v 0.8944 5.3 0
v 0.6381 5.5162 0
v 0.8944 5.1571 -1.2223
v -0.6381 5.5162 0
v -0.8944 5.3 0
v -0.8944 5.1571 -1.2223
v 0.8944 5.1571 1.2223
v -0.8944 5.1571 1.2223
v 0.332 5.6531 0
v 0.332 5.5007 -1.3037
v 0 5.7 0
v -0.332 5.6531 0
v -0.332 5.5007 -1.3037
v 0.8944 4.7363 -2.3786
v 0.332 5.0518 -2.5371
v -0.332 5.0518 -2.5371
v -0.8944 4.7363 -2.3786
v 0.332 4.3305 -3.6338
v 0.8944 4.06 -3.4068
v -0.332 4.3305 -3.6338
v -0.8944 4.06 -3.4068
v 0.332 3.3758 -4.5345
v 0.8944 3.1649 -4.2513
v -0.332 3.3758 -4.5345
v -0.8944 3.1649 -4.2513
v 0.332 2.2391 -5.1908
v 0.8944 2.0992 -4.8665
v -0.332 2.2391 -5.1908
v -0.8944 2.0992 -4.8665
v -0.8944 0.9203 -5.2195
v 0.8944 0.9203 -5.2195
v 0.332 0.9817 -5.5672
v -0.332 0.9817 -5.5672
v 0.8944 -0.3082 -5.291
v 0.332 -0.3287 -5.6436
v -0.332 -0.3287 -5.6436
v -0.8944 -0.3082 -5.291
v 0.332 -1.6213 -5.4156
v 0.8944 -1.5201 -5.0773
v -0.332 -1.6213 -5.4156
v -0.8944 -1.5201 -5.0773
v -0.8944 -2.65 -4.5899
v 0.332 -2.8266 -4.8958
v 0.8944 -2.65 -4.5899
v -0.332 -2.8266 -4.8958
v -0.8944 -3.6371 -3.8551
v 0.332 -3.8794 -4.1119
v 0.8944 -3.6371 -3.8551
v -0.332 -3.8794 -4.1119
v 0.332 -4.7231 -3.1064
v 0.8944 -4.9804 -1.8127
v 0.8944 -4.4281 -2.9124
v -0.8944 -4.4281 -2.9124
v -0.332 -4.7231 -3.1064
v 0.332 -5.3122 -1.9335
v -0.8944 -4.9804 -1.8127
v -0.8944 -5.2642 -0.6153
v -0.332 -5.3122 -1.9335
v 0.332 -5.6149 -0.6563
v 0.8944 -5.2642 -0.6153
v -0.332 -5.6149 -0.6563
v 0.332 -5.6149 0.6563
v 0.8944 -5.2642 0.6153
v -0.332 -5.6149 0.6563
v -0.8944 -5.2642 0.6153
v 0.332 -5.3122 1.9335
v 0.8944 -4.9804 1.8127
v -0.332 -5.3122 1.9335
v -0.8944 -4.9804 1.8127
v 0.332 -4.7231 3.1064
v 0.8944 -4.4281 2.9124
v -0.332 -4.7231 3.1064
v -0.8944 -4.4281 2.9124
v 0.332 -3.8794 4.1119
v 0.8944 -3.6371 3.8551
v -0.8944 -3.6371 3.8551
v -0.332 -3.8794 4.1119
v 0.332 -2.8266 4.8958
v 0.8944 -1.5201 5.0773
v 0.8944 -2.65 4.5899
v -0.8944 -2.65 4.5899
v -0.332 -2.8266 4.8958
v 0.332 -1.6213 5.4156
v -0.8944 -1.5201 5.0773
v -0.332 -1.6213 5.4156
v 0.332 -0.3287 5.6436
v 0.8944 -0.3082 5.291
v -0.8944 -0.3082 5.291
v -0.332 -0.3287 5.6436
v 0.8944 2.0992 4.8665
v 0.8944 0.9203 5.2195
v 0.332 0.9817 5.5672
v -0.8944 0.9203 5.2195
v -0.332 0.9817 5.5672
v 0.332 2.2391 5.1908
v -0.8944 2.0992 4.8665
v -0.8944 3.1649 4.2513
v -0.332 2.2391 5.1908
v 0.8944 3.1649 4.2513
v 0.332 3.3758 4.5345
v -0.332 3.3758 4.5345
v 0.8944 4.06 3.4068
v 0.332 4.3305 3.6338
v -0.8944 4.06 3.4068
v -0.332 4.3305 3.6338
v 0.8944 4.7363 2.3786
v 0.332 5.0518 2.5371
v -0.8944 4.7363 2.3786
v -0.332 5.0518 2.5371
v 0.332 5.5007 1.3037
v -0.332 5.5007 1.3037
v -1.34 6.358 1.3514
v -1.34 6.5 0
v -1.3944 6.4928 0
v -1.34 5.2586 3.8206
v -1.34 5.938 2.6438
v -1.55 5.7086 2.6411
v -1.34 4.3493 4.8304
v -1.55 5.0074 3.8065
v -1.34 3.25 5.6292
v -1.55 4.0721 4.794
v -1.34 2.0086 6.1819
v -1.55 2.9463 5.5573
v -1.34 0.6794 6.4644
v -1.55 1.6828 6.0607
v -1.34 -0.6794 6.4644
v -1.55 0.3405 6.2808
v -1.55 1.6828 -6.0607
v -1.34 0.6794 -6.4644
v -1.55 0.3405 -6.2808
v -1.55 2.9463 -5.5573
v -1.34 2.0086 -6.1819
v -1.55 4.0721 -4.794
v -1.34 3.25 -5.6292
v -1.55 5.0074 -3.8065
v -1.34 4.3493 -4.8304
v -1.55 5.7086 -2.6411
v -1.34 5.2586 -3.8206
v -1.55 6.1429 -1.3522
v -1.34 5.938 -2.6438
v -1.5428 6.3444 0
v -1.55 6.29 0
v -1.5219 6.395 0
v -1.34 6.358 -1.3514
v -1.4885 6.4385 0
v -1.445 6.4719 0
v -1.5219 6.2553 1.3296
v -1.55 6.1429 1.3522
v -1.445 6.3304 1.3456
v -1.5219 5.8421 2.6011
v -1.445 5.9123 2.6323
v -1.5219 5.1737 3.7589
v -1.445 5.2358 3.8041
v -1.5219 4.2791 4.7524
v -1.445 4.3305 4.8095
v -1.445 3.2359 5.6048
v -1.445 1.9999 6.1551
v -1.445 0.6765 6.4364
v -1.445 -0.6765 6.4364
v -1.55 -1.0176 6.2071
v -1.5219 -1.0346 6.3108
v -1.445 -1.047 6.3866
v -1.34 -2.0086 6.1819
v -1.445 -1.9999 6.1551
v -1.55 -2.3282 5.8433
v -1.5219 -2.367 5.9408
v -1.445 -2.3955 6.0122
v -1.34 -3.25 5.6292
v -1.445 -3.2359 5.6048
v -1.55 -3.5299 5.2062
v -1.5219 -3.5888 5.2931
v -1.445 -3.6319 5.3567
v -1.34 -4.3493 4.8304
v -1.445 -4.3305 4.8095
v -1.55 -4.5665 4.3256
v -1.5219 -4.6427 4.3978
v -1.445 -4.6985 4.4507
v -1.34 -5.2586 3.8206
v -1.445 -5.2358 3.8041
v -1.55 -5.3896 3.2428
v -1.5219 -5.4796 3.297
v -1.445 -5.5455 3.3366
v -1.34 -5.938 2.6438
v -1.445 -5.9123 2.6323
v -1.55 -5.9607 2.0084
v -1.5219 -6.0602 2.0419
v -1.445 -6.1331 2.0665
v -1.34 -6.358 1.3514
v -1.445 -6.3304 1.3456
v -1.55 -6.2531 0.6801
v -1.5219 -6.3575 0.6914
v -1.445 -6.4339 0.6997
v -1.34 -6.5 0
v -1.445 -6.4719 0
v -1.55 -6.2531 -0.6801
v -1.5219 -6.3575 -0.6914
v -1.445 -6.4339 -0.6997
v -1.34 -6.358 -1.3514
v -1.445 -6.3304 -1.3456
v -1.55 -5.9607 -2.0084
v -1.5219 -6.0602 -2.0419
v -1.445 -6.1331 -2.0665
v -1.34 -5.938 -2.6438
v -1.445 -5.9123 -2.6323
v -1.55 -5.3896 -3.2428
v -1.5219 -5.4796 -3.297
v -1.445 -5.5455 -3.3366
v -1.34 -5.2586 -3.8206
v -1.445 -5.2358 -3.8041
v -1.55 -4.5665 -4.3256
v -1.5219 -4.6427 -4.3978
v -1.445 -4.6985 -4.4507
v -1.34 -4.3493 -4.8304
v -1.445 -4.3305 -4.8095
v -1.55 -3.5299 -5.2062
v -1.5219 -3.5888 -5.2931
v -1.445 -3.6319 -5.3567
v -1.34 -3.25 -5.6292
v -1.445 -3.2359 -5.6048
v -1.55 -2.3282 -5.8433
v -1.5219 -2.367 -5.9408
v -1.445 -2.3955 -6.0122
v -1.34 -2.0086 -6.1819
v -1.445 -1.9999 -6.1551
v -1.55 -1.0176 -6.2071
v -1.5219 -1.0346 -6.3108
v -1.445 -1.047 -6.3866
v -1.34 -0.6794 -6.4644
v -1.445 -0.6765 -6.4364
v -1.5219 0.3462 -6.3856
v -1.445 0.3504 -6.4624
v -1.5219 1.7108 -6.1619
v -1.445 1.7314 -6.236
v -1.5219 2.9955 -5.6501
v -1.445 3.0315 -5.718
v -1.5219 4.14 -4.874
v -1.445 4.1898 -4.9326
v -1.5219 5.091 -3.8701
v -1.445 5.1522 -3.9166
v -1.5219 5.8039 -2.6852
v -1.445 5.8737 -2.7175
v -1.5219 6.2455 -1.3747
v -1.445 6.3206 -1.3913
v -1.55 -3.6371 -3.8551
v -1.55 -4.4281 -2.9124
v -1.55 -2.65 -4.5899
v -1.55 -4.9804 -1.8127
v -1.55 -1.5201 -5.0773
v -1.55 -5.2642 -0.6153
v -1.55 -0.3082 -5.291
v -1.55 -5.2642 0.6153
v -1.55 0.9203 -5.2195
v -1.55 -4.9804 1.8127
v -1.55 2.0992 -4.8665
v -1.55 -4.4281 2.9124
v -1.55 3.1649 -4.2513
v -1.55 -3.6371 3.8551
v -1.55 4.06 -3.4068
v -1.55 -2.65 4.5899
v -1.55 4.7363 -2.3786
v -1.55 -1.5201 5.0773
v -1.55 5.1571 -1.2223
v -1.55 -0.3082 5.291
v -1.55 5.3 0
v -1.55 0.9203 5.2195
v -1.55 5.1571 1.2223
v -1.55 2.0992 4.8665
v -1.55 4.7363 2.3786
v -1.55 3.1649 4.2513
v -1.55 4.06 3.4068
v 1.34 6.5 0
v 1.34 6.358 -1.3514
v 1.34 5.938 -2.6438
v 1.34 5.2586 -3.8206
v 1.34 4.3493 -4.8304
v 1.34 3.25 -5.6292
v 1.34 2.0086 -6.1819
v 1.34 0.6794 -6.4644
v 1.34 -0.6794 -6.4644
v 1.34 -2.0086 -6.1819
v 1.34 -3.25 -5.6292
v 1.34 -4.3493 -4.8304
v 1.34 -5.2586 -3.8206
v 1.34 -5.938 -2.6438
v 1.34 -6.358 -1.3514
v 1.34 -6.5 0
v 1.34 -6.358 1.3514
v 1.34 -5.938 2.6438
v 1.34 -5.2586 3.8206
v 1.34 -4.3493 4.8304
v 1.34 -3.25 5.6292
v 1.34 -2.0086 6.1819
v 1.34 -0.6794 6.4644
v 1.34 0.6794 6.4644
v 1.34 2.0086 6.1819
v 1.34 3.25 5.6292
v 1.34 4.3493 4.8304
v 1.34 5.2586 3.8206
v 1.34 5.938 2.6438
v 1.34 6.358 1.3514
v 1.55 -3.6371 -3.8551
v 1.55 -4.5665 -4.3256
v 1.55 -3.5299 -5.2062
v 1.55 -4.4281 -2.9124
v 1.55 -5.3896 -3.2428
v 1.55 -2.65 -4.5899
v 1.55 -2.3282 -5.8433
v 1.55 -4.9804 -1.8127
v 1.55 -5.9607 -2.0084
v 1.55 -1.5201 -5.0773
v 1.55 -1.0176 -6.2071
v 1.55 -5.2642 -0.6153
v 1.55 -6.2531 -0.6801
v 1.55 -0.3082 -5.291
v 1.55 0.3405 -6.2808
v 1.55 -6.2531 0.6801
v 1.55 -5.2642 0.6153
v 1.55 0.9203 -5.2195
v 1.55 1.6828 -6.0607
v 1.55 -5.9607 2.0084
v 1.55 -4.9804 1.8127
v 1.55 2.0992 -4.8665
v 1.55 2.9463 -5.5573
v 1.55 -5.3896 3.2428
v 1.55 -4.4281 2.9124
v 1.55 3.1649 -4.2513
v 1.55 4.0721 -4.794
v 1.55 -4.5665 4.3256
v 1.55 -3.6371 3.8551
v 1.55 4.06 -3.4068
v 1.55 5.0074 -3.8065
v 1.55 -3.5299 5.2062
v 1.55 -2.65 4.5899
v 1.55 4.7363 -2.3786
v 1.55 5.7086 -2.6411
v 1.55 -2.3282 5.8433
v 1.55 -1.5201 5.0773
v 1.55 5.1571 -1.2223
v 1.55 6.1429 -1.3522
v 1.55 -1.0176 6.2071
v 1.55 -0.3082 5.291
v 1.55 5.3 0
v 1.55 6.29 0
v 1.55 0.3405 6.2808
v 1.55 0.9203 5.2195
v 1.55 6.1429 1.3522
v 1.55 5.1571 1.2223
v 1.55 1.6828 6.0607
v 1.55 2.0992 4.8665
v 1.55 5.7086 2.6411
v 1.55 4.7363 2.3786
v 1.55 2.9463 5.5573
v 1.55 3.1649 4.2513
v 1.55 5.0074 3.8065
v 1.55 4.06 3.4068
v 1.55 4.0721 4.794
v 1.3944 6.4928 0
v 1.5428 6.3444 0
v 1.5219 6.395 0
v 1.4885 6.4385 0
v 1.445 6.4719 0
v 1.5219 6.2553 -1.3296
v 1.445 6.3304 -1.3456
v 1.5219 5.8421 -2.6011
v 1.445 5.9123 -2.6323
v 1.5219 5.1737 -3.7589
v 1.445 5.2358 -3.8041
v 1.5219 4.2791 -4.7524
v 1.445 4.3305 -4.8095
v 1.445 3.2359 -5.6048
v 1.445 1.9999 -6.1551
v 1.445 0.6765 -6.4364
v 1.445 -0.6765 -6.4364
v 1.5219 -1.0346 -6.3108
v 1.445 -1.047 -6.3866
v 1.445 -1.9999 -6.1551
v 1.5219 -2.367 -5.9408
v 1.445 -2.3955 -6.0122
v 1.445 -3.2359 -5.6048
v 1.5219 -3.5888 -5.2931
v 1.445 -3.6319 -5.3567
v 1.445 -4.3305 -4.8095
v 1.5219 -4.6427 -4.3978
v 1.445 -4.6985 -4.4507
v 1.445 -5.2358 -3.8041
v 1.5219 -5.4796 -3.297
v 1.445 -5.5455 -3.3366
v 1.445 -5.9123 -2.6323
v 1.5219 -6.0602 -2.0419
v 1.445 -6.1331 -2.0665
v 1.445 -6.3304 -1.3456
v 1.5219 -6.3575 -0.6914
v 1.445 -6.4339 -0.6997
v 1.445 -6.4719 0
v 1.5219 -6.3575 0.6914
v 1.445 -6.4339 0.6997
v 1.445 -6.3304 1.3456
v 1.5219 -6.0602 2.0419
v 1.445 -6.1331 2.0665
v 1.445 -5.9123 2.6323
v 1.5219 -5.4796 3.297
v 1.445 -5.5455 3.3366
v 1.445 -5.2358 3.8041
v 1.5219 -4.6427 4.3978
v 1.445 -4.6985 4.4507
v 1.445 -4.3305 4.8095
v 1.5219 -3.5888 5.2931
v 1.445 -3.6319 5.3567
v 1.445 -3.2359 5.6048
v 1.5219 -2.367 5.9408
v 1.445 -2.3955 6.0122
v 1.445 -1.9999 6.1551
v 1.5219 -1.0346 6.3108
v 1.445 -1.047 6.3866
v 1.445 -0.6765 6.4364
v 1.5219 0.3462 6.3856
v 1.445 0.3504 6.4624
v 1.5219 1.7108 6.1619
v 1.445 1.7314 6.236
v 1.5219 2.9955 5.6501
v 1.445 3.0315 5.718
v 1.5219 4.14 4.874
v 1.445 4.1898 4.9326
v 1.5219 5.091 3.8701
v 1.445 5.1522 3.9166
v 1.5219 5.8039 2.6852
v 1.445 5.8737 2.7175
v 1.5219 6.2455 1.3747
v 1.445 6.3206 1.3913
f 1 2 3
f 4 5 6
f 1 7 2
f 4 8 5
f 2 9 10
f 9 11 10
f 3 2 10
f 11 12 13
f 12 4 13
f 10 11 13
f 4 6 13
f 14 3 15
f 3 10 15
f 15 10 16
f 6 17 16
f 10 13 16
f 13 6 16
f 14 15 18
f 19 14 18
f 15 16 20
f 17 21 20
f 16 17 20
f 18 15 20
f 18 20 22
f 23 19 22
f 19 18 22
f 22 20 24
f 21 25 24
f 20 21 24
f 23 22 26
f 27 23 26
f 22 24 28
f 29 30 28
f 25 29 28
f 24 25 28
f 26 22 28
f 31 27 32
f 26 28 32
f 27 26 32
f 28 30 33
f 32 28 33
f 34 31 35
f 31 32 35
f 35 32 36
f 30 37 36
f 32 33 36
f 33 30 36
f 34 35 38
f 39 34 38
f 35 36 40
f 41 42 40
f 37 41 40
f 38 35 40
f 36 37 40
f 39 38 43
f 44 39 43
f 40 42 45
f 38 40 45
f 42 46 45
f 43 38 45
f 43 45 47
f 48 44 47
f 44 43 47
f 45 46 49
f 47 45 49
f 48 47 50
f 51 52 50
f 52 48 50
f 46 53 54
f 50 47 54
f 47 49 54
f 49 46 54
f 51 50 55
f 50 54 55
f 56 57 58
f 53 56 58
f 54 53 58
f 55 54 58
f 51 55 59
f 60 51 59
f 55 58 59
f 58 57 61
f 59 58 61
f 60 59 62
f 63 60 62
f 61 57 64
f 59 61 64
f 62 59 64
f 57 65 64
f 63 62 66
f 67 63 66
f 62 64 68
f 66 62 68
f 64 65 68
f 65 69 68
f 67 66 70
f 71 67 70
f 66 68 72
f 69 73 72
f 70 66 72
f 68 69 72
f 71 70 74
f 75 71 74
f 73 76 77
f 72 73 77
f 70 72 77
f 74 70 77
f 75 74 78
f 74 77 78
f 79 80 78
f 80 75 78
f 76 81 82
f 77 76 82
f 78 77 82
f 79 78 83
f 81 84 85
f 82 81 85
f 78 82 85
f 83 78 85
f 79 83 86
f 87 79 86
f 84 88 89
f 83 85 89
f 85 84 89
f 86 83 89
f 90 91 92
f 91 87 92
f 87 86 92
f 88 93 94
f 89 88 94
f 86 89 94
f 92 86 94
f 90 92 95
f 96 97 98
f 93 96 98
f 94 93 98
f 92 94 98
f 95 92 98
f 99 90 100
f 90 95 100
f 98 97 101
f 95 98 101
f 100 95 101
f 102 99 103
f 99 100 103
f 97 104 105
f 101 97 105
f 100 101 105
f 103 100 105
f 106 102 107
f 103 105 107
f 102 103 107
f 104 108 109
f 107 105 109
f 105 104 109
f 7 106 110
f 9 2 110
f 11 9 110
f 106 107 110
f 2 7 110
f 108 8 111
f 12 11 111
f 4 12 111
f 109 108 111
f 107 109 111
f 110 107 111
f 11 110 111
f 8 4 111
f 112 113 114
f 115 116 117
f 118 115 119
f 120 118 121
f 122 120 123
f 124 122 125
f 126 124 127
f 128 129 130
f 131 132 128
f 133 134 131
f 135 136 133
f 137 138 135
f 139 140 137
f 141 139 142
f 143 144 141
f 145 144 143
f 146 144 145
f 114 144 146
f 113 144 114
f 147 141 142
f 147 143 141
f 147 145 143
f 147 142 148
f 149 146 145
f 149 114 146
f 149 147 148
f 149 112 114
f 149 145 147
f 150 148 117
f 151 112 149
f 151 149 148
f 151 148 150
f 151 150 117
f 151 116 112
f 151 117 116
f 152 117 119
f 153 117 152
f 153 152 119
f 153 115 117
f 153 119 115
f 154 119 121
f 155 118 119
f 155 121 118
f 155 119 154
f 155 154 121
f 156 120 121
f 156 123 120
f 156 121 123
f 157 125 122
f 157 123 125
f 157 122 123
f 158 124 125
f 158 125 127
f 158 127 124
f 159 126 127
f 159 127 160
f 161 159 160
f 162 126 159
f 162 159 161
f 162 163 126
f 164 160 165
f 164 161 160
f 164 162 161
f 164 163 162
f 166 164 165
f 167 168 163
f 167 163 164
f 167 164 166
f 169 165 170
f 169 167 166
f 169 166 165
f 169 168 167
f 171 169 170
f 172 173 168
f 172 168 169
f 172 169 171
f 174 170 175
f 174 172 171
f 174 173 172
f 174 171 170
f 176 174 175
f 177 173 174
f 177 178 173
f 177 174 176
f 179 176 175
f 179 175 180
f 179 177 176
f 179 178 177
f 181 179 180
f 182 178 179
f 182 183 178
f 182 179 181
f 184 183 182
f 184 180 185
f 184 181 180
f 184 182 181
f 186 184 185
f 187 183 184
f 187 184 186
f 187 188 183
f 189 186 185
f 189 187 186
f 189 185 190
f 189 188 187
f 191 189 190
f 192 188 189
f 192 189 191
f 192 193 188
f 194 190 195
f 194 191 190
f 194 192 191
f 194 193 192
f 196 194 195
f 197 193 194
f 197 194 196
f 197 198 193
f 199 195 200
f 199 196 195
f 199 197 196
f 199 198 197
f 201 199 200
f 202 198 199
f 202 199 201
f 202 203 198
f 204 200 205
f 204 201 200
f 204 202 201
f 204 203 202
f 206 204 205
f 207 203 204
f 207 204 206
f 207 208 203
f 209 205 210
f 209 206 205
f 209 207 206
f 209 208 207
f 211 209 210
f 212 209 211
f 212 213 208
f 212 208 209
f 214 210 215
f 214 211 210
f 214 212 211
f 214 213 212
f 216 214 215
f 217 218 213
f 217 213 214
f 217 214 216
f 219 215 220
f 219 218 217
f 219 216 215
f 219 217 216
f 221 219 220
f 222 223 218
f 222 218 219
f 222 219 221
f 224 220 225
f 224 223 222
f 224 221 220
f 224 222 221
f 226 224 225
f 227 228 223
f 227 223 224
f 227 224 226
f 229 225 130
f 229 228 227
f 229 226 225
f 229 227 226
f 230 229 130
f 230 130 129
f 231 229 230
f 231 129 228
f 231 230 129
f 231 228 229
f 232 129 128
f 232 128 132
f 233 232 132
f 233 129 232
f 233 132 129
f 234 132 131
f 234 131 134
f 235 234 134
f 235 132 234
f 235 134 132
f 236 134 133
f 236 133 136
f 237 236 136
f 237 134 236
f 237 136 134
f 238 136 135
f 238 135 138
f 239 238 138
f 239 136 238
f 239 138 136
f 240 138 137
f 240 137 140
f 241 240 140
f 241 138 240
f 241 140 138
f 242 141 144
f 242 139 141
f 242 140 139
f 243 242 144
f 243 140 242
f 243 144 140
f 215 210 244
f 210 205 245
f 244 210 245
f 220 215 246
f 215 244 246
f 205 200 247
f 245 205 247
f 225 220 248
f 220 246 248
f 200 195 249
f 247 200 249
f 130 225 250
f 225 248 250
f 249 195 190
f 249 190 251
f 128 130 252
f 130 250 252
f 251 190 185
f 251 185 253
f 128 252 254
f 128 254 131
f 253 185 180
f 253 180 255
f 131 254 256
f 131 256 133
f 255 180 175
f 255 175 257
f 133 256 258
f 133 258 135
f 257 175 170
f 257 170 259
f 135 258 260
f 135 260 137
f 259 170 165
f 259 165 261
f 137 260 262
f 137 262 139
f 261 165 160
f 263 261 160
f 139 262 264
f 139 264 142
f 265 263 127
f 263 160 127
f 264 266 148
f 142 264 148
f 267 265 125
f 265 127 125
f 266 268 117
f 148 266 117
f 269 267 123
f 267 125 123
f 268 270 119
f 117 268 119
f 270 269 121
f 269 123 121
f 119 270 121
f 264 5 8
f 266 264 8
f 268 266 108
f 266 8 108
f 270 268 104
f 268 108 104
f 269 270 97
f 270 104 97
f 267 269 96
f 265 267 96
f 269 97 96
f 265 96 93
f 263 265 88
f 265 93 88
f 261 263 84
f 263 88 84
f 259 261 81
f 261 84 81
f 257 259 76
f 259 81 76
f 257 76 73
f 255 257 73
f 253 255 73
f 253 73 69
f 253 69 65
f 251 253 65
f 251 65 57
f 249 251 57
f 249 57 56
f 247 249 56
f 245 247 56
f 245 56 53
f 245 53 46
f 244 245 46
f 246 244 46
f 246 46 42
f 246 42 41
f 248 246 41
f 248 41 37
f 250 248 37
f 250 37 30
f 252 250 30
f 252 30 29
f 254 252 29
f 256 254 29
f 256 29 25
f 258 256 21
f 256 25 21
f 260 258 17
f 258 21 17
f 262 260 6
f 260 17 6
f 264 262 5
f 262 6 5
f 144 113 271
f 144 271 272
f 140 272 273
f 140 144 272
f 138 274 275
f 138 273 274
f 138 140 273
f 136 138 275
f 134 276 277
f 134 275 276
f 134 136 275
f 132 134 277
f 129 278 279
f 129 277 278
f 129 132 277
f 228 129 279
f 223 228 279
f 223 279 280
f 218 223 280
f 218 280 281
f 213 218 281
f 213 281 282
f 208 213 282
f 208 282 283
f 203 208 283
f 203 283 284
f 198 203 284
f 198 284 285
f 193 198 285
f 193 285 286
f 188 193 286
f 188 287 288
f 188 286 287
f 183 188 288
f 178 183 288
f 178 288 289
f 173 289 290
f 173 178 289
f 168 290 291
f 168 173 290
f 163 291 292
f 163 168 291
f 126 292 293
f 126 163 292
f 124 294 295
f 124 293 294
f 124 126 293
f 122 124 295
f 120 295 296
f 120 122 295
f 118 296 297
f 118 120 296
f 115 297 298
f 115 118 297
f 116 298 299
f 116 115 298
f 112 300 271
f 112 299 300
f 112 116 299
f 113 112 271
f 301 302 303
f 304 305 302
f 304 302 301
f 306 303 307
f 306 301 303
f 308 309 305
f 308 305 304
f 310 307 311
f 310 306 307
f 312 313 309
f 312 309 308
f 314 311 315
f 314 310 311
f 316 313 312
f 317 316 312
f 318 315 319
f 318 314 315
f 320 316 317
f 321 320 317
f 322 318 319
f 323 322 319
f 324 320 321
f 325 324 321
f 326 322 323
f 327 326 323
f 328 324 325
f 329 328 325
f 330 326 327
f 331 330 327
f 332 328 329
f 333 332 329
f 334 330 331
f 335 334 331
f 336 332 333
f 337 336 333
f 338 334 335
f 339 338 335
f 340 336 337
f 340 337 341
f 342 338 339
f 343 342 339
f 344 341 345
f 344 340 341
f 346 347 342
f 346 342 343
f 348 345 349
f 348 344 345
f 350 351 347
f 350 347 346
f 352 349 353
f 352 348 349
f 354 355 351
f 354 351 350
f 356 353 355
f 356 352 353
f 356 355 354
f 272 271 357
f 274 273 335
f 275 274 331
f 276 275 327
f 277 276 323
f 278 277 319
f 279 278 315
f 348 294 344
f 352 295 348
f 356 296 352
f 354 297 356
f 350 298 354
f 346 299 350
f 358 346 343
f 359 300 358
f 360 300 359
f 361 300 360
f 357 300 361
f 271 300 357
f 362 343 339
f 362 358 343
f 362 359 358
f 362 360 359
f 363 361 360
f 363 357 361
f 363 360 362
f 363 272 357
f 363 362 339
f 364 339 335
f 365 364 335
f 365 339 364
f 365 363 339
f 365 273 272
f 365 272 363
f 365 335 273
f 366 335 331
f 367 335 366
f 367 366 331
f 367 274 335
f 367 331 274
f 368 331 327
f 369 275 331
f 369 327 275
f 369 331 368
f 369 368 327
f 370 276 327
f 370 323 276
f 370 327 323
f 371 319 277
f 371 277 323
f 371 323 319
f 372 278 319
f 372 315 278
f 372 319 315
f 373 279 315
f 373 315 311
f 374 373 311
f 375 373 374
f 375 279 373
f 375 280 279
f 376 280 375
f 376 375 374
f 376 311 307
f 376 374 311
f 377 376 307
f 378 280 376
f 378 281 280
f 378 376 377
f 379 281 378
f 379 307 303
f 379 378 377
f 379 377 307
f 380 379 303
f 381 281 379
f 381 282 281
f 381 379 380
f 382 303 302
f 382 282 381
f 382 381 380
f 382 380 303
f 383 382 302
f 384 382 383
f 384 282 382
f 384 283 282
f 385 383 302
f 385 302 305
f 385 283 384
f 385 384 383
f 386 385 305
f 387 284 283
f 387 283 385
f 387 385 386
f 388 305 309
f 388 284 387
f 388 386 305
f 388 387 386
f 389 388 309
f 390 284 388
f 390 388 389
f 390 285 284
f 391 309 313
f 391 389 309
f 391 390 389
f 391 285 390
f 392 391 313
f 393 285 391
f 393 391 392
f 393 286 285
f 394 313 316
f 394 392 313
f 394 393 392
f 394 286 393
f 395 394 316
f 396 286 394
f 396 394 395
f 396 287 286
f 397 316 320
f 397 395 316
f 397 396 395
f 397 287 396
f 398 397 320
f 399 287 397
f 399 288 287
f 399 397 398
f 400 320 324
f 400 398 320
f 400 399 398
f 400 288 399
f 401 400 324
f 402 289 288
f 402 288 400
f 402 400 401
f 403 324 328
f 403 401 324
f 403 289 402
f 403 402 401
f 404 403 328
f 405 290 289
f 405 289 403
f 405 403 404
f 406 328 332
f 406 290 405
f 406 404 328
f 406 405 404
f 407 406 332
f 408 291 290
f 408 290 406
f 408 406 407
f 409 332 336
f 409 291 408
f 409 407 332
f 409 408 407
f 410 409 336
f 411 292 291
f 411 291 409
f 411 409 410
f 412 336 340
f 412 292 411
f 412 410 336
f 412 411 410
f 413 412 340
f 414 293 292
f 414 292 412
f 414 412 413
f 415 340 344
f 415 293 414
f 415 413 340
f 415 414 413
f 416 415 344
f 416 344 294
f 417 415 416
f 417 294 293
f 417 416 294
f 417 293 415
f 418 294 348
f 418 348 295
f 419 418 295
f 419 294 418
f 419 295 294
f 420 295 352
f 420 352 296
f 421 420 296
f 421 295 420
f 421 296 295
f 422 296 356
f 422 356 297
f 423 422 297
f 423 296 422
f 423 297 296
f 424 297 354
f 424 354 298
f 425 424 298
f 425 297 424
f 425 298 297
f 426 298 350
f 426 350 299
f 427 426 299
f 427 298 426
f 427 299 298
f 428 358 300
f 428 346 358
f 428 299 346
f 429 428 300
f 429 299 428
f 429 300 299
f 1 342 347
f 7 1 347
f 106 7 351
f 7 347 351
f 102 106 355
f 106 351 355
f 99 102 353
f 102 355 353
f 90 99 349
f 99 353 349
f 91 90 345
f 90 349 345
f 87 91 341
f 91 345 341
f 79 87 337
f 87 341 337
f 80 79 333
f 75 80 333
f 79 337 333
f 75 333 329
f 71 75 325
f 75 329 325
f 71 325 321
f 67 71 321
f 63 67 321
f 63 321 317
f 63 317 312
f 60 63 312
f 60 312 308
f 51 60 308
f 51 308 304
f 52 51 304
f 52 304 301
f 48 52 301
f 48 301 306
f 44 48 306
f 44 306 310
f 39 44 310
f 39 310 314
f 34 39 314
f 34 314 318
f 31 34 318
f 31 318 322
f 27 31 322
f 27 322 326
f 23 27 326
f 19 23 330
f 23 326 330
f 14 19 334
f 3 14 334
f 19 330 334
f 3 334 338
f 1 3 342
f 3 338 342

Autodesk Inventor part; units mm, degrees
ref_plane "YZ Plane" through (0, 0, 0) normal (1, 0, 0) x (0, 1, 0)
ref_plane "XZ Plane" through (0, 0, 0) normal (0, 1, 0) x (-1, 0, 0)
ref_plane "XY Plane" through (0, 0, 0) normal (0, 0, 1) x (1, 0, 0)
sketch "Sketch2" plane through (0, 0, 0) normal (0, 0, 1) x (1, 0, 0)
  line L0 (1.55, 6.5) -> (-1.55, 6.5)
  line L1 (-1.55, 6.5) -> (-1.55, 5.3)
  line L2 (-1.55, 5.3) -> (1.55, 5.3)
  line L3 (1.55, 5.3) -> (1.55, 6.5)
  arc A0 (0.8944, 5.3) -> (-0.8944, 5.3) centre (0, 4.5) ccw
  line L4 (-2.17, 0) -> (2.17, 0) projected
  point P0 (0, 0)
  dimension "d8" = 3.1
  dimension "d9" = 1.2
  dimension "d10" = 1.55
  dimension "d11" = 5.3
  dimension "d12" = 0.8
  dimension "d13" = 1.2
revolve "Revolution2" add sketch "Sketch2" angle 360 about axis through (-10, 0, 0) along (1, 0, 0) contours L3 L2 A0 L1 L0
fillet "Fillet1" radius 0.21 2 edges at (1.55, -6.5, 0) (-1.55, -6.5, 0)
properties part number "Outer Ring(fixed)"
